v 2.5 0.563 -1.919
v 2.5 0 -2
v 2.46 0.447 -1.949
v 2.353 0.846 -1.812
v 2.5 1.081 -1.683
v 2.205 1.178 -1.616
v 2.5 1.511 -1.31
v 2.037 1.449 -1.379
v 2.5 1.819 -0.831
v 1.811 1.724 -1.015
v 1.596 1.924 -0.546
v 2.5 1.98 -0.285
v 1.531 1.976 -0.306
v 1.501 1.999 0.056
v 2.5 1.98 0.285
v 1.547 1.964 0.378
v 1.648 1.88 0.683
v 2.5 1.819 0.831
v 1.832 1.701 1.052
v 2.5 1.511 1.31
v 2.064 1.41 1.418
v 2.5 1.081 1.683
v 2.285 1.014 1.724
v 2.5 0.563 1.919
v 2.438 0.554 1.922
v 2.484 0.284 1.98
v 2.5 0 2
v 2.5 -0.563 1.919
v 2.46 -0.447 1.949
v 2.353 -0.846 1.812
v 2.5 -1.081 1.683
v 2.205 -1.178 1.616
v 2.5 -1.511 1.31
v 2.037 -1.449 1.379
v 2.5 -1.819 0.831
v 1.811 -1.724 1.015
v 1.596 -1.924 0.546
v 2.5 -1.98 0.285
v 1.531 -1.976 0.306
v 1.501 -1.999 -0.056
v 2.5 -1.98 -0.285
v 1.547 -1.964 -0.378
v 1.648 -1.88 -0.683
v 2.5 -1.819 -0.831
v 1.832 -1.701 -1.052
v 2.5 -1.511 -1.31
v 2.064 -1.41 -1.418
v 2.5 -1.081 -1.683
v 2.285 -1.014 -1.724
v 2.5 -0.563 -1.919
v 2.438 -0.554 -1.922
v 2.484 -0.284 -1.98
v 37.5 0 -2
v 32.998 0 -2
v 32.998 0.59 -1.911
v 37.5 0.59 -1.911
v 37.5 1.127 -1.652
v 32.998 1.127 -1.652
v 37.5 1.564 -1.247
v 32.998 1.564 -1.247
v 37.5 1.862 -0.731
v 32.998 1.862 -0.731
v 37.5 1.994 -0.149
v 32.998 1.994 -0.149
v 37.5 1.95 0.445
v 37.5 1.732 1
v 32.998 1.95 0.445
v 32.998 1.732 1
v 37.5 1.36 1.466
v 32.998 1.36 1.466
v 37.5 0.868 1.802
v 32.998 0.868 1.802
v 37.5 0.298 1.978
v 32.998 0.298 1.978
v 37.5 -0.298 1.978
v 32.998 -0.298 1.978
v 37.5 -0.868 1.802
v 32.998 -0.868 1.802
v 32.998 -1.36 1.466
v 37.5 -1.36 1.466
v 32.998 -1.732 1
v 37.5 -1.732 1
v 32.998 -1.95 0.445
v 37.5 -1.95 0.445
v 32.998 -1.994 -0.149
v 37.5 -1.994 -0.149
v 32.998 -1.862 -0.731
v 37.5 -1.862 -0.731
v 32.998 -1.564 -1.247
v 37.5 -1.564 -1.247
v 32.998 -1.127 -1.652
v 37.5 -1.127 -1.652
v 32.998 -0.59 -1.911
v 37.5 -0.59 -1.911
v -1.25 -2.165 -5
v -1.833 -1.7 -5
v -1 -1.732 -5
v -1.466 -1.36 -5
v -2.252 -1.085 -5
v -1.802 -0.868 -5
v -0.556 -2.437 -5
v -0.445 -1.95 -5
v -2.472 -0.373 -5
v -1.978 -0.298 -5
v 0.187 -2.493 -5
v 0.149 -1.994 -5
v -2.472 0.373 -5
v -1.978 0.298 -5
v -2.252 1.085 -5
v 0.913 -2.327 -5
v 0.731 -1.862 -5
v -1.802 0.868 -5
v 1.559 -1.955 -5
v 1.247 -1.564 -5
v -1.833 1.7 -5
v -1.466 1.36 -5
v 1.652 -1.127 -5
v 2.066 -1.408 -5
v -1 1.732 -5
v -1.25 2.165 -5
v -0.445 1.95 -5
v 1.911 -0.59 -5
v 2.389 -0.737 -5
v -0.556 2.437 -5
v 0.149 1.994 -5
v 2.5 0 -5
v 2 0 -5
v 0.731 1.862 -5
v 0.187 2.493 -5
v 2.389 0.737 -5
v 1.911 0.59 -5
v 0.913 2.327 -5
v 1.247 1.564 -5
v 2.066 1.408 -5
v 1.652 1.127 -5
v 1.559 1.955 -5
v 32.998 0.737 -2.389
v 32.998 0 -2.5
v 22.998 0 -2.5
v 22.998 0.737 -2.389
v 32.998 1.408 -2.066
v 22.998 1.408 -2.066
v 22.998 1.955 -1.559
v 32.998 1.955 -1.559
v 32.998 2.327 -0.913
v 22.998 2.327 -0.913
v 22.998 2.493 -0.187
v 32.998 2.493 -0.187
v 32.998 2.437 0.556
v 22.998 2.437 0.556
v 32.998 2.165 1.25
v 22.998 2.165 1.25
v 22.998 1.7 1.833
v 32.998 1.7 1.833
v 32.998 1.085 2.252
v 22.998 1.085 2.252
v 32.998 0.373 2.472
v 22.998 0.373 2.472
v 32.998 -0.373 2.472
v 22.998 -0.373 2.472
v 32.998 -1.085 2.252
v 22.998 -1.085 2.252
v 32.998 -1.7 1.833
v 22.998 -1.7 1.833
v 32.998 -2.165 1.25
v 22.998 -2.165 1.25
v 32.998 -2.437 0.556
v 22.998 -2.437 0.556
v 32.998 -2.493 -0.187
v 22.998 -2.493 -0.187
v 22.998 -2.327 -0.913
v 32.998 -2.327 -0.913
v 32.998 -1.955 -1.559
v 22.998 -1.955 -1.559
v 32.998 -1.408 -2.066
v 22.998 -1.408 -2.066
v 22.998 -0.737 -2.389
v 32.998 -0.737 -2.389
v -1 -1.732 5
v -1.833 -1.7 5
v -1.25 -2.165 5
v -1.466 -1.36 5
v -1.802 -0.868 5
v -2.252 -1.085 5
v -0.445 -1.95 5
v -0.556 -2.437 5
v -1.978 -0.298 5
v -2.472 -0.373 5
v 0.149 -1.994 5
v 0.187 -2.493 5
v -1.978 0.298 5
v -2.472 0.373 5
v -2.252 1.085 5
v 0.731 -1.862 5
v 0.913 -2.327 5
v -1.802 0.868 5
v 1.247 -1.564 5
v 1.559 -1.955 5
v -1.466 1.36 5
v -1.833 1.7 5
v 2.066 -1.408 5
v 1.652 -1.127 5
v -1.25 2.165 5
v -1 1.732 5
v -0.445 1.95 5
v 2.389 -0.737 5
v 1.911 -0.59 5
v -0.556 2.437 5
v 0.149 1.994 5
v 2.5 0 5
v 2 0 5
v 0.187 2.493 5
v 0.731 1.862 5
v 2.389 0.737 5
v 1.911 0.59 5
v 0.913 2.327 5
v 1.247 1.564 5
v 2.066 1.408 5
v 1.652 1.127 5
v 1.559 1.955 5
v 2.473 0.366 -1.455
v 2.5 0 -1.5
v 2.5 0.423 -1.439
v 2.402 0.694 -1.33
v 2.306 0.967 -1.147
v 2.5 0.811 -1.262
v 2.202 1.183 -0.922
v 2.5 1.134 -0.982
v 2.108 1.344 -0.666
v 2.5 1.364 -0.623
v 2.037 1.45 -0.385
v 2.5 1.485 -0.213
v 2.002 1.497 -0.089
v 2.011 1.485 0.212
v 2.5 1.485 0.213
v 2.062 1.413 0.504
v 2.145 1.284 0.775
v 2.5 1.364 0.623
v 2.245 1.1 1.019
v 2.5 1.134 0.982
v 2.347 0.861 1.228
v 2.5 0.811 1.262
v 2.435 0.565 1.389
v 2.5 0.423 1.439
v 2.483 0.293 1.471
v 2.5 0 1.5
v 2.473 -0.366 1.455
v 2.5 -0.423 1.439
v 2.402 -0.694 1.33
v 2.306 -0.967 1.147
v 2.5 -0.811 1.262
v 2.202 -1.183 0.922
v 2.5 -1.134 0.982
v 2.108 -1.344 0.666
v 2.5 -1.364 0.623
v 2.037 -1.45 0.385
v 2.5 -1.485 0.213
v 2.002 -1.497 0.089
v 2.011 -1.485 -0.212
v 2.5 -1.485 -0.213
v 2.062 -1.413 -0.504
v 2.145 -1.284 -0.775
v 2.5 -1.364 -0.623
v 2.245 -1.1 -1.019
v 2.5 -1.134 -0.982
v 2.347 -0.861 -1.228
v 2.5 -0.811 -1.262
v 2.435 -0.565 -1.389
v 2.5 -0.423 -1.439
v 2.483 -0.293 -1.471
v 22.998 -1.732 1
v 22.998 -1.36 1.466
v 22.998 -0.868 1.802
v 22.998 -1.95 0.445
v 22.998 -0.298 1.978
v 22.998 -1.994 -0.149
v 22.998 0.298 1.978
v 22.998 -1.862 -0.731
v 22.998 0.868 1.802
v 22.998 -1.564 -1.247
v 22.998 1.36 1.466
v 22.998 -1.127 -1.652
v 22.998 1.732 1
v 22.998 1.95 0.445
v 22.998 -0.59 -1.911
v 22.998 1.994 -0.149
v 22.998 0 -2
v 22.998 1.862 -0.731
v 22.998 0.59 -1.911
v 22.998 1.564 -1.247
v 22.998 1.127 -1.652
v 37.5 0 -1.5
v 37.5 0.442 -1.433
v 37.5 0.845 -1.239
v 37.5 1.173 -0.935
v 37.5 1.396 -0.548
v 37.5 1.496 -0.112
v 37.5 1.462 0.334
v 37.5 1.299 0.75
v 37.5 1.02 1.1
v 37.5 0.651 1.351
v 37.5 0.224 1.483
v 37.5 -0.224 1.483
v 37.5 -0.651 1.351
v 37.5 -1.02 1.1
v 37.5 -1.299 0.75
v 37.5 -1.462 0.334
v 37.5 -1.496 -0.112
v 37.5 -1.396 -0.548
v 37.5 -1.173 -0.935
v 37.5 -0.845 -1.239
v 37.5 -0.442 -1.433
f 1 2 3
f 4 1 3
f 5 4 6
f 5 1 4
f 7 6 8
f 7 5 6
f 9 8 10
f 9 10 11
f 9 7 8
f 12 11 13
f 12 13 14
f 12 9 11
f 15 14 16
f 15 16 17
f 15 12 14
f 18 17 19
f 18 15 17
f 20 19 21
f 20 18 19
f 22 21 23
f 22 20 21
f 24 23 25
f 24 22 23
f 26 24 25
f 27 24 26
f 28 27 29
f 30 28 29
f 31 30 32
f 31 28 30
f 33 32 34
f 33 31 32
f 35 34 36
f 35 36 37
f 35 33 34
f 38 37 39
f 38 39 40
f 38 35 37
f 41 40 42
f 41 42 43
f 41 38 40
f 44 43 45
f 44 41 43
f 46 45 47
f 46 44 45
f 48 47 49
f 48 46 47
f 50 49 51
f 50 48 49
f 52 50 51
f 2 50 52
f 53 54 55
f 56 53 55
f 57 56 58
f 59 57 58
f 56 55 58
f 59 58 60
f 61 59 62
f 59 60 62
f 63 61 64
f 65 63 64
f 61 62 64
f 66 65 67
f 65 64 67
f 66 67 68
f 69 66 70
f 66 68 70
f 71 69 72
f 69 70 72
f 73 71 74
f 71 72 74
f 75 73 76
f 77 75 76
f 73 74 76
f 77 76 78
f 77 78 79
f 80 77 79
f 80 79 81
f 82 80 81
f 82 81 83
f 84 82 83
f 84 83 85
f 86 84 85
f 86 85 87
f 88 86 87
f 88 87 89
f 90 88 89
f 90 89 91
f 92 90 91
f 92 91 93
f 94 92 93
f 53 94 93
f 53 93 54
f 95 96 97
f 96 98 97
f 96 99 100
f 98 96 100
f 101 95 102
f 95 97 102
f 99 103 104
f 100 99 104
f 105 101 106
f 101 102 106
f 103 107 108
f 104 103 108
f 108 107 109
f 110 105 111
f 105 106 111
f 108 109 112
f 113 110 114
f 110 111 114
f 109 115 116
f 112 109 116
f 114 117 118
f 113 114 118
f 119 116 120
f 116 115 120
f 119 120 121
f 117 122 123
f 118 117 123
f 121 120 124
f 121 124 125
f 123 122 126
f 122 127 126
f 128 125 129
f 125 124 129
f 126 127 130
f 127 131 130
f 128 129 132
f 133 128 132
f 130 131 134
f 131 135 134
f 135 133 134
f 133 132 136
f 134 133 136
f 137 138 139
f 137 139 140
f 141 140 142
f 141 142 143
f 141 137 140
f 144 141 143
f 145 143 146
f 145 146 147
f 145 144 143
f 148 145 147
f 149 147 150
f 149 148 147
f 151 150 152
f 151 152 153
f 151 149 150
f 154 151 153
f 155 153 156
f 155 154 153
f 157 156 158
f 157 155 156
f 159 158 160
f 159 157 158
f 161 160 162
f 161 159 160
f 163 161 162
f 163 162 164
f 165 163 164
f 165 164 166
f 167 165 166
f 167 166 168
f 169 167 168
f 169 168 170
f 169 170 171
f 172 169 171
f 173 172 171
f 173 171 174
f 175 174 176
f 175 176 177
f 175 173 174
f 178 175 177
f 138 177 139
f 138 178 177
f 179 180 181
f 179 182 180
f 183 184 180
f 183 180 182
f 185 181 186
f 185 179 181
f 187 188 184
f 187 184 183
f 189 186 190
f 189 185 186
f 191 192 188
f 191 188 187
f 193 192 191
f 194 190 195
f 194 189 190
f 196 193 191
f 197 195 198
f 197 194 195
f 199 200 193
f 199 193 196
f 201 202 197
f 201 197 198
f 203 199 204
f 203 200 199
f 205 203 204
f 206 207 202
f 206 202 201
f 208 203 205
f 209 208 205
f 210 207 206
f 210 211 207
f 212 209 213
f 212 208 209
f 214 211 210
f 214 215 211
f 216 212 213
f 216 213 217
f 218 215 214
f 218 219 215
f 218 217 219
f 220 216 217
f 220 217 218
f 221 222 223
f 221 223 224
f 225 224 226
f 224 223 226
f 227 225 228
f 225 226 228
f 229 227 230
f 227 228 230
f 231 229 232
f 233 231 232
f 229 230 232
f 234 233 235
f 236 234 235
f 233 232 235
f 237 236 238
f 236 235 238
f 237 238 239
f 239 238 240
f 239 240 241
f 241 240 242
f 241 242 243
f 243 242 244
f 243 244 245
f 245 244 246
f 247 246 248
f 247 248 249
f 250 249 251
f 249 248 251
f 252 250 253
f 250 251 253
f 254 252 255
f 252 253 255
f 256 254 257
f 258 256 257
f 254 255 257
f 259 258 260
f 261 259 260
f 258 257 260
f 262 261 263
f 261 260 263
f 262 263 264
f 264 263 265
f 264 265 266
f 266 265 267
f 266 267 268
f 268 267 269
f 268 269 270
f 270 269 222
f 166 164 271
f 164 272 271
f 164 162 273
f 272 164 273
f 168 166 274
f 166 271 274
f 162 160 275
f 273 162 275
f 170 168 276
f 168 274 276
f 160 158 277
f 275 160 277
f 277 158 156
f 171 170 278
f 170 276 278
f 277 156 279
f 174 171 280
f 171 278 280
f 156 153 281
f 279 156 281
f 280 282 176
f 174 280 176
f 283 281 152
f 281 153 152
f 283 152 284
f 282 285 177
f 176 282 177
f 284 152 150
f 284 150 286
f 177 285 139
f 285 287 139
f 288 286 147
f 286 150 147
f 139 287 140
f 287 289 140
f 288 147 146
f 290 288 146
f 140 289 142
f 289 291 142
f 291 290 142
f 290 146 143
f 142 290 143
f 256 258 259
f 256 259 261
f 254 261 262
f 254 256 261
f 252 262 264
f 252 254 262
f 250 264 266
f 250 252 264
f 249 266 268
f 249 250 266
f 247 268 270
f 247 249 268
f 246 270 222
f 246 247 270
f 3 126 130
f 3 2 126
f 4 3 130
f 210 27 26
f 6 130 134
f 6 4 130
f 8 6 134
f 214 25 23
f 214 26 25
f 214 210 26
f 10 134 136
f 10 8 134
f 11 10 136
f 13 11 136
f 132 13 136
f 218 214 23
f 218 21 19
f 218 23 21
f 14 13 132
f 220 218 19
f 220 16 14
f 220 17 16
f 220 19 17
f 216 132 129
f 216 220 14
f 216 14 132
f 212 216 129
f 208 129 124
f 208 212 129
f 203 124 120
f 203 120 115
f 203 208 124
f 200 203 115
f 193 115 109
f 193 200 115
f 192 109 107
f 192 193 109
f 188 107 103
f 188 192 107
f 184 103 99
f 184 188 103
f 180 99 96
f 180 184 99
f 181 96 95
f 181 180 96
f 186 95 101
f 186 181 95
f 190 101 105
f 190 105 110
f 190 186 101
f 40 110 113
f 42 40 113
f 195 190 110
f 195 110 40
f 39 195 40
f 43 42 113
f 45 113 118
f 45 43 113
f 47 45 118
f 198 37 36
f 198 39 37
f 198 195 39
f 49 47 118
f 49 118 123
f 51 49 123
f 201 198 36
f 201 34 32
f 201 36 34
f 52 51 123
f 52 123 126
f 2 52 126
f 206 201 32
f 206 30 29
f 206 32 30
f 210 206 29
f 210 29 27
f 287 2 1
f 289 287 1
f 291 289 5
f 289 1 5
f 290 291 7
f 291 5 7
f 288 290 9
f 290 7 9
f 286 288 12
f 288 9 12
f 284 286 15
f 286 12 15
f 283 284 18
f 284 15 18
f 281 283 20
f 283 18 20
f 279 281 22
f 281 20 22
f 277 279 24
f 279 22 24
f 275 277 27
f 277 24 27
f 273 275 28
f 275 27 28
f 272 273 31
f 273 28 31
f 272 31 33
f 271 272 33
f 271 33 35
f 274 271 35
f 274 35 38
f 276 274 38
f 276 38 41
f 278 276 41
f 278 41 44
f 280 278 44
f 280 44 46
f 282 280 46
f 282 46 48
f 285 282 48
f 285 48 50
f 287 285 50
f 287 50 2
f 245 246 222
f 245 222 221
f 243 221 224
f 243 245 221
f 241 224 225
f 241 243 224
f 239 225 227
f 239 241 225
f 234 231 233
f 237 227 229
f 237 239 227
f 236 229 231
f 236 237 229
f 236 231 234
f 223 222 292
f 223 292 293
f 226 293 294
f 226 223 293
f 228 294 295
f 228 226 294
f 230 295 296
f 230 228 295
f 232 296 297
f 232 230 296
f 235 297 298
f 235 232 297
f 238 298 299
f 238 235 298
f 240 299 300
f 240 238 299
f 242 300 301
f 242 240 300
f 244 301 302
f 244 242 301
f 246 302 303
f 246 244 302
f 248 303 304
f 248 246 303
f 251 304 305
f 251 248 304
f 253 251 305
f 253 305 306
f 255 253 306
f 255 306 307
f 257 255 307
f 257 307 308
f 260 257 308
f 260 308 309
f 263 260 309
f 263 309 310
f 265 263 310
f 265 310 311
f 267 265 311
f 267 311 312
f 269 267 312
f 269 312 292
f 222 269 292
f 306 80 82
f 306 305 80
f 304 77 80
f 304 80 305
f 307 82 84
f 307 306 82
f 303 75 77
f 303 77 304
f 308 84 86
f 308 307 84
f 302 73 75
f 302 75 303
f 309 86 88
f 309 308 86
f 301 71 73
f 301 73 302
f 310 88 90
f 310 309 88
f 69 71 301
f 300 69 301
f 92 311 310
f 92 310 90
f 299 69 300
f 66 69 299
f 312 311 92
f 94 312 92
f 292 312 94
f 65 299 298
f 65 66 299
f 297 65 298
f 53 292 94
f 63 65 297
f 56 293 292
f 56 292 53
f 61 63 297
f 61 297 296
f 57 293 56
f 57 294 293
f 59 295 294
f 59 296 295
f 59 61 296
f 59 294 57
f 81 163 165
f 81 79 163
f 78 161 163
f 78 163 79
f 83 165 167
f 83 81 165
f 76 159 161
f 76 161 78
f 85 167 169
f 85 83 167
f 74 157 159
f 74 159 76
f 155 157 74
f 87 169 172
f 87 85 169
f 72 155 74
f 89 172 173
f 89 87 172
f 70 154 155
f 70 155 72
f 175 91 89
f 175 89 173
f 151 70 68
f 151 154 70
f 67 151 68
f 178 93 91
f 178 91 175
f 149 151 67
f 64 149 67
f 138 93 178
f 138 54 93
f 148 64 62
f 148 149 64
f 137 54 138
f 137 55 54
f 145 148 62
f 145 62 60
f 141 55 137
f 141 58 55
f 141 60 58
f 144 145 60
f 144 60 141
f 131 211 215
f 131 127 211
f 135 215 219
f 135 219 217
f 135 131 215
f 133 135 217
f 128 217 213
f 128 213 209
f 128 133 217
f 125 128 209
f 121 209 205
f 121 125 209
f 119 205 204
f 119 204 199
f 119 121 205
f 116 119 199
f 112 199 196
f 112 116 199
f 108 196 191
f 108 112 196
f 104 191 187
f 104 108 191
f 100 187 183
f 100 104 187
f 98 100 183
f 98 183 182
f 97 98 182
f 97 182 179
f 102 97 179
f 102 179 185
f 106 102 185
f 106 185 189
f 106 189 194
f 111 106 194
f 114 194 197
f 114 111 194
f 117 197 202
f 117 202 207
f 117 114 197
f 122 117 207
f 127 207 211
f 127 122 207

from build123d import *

# Parameters (mm, degrees)
IZIM1_R                                 = 2.5
IZIM1_R_2                               = 2
Y_KSEKLIK_EKSTR_ZYON1_DEPTH             = 5
IZIM2_R                                 = 2
IZIM2_R_2                               = 1.5
Y_KSEKLIK_EKSTR_ZYON2_DEPTH             = 35
Y_KSEKLIK_EKSTR_ZYON2_DIRECTION_2_REACH = 7
IZIM3_R                                 = 2.5
IZIM3_R_2                               = 2
Y_KSEKLIK_EKSTR_ZYON3_DEPTH             = 10


with BuildPart() as part:
    # Çizim1 → Yükseklik-Ekstrüzyon1 (new body, symmetric)
    with BuildSketch(Plane.XY):
        Circle(IZIM1_R)
        Circle(IZIM1_R_2, mode=Mode.SUBTRACT)
    extrude(amount=Y_KSEKLIK_EKSTR_ZYON1_DEPTH, both=True)

    # Çizim2 → Yükseklik-Ekstrüzyon2 (add)
    with BuildSketch(Plane(origin=(2.5, 0, 0), x_dir=(0, 0, -1), z_dir=(1, 0, 0))):
        Circle(IZIM2_R)
        Circle(IZIM2_R_2, mode=Mode.SUBTRACT)
    extrude(amount=Y_KSEKLIK_EKSTR_ZYON2_DEPTH)

    # Çizim2 → Yükseklik-Ekstrüzyon2 direction 2 (add, up to next)
    with BuildSketch(Plane(origin=(2.5, 0, 0), x_dir=(0, 0, -1), z_dir=(1, 0, 0)), mode=Mode.PRIVATE) as y_kseklik_ekstr_zyon2_direction_2_sk1:
        Circle(IZIM2_R)
        Circle(IZIM2_R_2, mode=Mode.SUBTRACT)
    y_kseklik_ekstr_zyon2_direction_2_tool1 = extrude(y_kseklik_ekstr_zyon2_direction_2_sk1.sketch, amount=-Y_KSEKLIK_EKSTR_ZYON2_DIRECTION_2_REACH, mode=Mode.PRIVATE) - part.part
    add(y_kseklik_ekstr_zyon2_direction_2_tool1.solids().sort_by_distance((2.5, 0, 1.943431))[0])
    add(y_kseklik_ekstr_zyon2_direction_2_tool1.solids().sort_by_distance((2.5, 0, 1.943431))[1])

    # Çizim3 → Yükseklik-Ekstrüzyon3 (add)
    with BuildSketch(Plane(origin=(32.997737042, 0, 0), x_dir=(0, 0, -1), z_dir=(1, 0, 0))):
        Circle(IZIM3_R)
        Circle(IZIM3_R_2, mode=Mode.SUBTRACT)
    extrude(amount=-Y_KSEKLIK_EKSTR_ZYON3_DEPTH)


solid = part.part
